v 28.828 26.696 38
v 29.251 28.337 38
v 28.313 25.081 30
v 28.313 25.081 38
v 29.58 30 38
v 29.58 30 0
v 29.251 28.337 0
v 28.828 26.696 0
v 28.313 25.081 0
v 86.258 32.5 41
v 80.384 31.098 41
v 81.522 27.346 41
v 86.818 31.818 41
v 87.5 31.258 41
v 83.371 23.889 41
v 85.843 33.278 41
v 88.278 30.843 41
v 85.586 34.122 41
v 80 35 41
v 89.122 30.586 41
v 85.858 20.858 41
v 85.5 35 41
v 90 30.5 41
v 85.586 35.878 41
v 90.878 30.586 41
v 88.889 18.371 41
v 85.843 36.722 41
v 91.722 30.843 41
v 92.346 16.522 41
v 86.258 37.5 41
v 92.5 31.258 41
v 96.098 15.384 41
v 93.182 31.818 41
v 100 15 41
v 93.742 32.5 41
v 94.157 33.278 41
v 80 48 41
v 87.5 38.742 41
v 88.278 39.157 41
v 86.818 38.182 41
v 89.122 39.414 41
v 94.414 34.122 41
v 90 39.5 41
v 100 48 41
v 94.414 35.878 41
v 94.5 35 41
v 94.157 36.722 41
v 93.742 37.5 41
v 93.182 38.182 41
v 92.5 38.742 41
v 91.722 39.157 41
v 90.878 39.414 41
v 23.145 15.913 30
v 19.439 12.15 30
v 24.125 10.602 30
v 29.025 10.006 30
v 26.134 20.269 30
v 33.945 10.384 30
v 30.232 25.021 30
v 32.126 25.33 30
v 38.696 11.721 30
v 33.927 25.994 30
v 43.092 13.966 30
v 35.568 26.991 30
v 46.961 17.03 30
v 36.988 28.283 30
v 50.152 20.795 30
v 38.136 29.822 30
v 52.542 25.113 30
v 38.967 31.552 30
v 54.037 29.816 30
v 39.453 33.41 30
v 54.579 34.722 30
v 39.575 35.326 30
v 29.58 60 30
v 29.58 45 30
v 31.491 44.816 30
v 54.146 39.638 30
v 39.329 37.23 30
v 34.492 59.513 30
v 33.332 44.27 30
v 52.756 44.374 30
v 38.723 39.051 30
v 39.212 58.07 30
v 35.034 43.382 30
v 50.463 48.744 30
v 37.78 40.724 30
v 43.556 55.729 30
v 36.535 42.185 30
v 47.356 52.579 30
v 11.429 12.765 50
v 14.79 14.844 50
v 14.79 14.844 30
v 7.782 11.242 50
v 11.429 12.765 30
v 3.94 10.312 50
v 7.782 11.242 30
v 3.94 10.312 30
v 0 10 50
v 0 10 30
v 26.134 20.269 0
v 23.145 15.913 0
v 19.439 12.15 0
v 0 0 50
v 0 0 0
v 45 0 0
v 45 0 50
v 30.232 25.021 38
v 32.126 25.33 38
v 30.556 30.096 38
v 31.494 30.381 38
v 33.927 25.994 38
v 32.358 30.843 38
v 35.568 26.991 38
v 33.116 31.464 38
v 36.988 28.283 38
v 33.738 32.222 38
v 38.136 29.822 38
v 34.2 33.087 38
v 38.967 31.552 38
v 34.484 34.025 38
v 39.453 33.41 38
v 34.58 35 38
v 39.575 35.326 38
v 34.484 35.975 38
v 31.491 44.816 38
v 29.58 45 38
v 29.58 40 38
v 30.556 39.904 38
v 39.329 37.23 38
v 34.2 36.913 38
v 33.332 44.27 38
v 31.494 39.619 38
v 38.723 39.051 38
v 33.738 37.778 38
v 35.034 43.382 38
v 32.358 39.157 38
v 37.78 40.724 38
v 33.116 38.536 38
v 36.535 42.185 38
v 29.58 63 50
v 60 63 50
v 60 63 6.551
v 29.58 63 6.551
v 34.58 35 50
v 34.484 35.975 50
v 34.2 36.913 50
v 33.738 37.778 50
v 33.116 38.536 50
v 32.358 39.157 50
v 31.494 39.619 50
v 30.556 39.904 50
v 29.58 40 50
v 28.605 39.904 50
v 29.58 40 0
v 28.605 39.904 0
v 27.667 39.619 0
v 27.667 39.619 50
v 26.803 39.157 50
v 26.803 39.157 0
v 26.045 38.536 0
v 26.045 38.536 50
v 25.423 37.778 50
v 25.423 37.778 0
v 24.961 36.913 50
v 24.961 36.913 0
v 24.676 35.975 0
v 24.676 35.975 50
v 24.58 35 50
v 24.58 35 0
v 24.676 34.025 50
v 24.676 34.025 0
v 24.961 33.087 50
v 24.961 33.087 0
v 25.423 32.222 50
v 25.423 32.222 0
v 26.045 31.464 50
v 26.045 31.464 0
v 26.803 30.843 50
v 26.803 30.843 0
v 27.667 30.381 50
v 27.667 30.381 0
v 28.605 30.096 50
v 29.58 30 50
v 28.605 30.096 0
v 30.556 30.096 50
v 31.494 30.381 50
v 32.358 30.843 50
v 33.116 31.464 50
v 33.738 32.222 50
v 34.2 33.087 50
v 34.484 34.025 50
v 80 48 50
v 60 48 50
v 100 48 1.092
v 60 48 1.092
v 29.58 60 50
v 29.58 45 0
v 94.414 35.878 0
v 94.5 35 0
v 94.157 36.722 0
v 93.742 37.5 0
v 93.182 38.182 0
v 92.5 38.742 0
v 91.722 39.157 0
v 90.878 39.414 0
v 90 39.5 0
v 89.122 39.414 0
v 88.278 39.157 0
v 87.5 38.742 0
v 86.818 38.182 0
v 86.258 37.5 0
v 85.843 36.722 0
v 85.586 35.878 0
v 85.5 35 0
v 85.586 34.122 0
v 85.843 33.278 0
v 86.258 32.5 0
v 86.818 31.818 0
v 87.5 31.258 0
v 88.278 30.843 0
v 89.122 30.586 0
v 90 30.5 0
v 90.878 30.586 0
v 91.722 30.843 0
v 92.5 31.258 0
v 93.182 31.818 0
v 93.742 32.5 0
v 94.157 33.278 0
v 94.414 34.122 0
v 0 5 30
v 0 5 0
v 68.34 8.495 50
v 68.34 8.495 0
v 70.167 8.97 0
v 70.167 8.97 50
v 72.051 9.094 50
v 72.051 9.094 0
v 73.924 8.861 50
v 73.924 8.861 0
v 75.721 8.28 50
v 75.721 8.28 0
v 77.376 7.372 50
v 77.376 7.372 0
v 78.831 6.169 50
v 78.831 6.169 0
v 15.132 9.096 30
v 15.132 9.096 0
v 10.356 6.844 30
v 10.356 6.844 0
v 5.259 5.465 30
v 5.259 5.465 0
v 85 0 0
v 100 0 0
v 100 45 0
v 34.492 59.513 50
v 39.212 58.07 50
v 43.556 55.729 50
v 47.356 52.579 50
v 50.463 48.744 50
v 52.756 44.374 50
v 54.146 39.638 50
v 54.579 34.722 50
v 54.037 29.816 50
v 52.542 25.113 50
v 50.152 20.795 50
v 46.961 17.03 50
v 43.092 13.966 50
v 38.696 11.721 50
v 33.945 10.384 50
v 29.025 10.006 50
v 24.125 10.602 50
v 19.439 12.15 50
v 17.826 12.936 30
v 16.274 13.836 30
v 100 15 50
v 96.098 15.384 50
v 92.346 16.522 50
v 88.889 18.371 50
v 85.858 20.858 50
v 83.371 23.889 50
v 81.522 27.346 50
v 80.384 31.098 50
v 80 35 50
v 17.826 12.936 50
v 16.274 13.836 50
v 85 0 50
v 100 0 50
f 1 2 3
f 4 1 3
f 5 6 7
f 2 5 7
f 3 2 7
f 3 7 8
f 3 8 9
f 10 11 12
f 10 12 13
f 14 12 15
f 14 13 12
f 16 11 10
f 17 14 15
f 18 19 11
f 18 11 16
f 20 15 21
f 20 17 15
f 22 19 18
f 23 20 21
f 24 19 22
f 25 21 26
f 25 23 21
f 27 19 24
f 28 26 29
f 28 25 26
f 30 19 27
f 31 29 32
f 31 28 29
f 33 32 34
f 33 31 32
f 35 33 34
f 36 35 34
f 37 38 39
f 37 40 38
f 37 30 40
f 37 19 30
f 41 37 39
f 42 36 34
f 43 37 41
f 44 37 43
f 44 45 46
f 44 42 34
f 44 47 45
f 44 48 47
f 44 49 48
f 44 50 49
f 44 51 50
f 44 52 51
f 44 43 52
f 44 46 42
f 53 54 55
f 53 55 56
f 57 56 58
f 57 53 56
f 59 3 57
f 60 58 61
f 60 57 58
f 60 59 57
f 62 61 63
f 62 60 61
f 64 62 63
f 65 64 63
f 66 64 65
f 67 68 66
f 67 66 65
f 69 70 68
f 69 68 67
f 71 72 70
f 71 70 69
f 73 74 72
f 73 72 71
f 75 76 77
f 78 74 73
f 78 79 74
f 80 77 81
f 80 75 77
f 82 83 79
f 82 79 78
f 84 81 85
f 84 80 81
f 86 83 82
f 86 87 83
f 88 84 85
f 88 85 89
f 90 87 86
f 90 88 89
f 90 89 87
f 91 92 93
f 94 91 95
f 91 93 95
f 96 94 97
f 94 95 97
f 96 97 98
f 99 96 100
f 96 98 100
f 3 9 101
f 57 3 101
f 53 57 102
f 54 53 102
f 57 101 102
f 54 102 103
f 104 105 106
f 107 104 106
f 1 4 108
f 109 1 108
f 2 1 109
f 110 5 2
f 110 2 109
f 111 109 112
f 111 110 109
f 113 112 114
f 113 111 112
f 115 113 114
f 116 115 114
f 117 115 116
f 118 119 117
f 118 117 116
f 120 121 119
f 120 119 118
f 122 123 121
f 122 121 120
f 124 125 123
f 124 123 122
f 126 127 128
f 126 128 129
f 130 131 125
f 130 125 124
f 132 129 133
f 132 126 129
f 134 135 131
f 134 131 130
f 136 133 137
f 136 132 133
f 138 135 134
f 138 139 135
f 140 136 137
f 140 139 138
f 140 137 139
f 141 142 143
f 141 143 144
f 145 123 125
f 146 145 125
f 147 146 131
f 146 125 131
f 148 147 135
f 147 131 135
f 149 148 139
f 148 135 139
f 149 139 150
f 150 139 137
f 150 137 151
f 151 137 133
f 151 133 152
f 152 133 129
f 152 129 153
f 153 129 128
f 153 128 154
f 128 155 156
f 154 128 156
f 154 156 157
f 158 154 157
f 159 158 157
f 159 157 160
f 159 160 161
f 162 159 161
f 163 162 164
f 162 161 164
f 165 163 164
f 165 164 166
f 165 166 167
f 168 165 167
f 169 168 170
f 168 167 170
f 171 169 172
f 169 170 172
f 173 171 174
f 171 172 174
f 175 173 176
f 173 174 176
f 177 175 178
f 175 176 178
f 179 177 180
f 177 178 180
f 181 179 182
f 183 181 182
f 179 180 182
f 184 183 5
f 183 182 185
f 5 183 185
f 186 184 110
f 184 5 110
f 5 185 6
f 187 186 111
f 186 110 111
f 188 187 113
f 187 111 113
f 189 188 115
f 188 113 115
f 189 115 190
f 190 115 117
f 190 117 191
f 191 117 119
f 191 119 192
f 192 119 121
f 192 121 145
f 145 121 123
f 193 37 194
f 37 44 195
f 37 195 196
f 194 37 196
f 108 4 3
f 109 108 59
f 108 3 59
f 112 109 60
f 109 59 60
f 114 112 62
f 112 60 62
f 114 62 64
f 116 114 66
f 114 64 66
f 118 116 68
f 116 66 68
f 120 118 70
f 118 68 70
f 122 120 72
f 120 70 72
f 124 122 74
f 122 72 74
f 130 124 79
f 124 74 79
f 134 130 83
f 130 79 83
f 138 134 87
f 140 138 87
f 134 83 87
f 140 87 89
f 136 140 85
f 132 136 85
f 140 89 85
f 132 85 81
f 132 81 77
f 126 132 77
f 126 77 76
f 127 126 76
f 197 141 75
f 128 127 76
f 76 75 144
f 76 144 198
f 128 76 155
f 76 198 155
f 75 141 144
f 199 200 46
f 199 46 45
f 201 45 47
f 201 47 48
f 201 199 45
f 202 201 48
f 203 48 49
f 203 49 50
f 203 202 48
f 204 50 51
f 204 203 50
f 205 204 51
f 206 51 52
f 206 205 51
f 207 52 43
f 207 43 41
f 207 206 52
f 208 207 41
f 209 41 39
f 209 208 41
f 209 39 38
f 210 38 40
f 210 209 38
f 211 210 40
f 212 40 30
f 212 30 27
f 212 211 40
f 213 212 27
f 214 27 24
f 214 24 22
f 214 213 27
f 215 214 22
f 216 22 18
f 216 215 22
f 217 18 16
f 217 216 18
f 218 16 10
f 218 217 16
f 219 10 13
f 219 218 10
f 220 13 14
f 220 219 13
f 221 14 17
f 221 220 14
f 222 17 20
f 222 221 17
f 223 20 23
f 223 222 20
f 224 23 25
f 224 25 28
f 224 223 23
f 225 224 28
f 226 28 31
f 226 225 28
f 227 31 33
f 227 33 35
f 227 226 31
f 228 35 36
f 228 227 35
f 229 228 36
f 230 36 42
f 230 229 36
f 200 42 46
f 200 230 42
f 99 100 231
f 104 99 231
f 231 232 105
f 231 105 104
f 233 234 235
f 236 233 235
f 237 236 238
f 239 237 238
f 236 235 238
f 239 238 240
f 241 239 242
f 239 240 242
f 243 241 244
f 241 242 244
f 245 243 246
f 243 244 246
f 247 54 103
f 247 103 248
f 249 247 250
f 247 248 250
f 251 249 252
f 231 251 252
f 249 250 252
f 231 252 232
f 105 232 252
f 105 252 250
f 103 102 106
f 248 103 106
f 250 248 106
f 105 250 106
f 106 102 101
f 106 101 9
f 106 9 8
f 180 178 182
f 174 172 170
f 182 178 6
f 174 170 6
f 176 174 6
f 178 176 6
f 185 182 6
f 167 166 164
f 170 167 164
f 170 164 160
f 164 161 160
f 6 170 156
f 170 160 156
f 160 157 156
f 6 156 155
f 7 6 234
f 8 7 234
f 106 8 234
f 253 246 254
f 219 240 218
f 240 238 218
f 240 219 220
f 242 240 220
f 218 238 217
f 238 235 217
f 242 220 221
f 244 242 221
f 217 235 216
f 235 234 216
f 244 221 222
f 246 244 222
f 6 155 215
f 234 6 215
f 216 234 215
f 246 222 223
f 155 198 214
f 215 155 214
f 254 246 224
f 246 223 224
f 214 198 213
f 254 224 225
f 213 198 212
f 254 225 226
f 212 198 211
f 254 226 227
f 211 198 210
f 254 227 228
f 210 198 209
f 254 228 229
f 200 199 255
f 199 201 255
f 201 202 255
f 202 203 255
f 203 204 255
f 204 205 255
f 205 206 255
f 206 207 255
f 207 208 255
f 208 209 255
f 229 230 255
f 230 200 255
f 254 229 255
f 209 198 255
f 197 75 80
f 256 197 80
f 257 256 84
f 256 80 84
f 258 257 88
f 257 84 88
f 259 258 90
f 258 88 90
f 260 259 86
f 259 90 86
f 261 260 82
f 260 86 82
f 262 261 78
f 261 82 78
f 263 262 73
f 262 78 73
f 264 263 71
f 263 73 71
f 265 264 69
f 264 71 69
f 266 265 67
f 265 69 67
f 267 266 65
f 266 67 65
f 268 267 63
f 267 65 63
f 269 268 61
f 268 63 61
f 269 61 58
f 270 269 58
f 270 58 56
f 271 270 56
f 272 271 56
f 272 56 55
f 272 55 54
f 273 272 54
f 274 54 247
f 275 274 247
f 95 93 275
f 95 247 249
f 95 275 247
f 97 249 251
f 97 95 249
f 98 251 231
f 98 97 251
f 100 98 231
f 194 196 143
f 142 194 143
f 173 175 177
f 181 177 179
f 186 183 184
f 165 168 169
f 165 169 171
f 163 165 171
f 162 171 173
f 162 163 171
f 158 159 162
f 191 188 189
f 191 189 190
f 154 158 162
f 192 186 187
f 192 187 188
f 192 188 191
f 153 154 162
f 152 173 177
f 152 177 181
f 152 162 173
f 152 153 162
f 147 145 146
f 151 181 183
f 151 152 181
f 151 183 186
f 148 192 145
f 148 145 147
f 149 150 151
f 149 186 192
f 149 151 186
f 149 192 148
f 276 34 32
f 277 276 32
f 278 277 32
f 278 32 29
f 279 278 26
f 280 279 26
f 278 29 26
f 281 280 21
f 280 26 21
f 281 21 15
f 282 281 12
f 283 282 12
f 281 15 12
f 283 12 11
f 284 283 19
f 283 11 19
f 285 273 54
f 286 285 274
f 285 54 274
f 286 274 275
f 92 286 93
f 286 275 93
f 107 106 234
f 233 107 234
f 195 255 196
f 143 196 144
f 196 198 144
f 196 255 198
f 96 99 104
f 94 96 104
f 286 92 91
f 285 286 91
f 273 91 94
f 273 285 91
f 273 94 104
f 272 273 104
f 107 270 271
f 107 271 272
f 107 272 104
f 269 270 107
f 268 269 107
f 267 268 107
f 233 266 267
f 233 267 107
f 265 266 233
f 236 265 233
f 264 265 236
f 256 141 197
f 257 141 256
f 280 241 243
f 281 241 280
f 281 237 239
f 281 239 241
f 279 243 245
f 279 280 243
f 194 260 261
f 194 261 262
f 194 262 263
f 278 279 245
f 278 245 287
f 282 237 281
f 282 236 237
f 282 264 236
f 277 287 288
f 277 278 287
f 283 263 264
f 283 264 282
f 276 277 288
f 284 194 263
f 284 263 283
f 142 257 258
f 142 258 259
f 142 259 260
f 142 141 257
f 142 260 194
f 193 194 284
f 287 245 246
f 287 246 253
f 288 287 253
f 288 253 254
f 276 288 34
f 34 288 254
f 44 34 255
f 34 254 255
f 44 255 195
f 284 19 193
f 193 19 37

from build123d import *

# Parameters (mm, degrees)
BOSS_EXTRUDE1_DEPTH     = 50
SKETCH1_R               = 5
BOSS_EXTRUDE1_2_DEPTH   = 50
SKETCH1_5_R             = 4.5
BOSS_EXTRUDE2_DEPTH     = 41
BOSS_EXTRUDE3_DEPTH     = 30
BOSS_EXTRUDE4_DEPTH     = 38
CUT_EXTRUDE1_DEPTH      = 30
CUT_EXTRUDE2_DEPTH      = 101.344406919
CUT_EXTRUDE2_DEPTH_BACK = 101.344406919


with BuildPart() as part:
    # Sketch1 → Boss-Extrude1 (new body)
    with BuildSketch(Plane.XY):
        with BuildLine():
            Line((80, 48), (60, 48))
            Line((60, 48), (60, 63))
            Line((60, 63), (29.580398915, 63))
            Line((29.580398915, 63), (29.580398915, 60))
            ThreePointArc((29.580398915, 60), (53.338461855, 27.218326313), (14.790199458, 14.844355629))
            ThreePointArc((14.790199458, 14.844355629), (7.781673687, 11.241937061), (0, 10))
            Line((0, 10), (0, 0))
            Line((0, 0), (45, 0))
            Line((45, 0), (68.339650933, 8.494938218))
            ThreePointArc((68.339650933, 8.494938218), (73.924248506, 8.860972081), (78.830920178, 6.169079822))
            Line((78.830920178, 6.169079822), (85, 0))
            Line((85, 0), (100, 0))
            Line((100, 0), (100, 15))
            ThreePointArc((100, 15), (85.857864376, 20.857864376), (80, 35))
            Line((80, 35), (80, 48))
        make_face()
    extrude(amount=BOSS_EXTRUDE1_DEPTH)

    # Sketch1<5> → Boss-Extrude2 (add)
    with BuildSketch(Plane.XY):
        with BuildLine():
            Line((100, 48), (80, 48))
            Line((80, 48), (80, 35))
            ThreePointArc((80, 35), (85.857864376, 20.857864376), (100, 15))
            Line((100, 15), (100, 48))
        make_face()
        with Locations((90, 35)):
            Circle(SKETCH1_5_R, mode=Mode.SUBTRACT)
    extrude(amount=BOSS_EXTRUDE2_DEPTH)

    # Sketch1<6> → Boss-Extrude3 (add)
    with BuildSketch(Plane.XY):
        with BuildLine():
            ThreePointArc((19.438547859, 12.149554553), (54.037106954, 29.816426724), (29.580398915, 60))
            Line((29.580398915, 60), (29.580398915, 45))
            ThreePointArc((29.580398915, 45), (39.560207875, 34.364851879), (28.312667533, 25.080682627))
            ThreePointArc((28.312667533, 25.080682627), (24.735564703, 18.024964247), (19.438547859, 12.149554553))
        make_face()
    extrude(amount=BOSS_EXTRUDE3_DEPTH)



with BuildPart() as body_2:
    # Sketch1 → Boss-Extrude1 2 (new body)
    with BuildSketch(Plane.XY):
        with Locations((29.580398915, 35)):
            Circle(SKETCH1_R)
    extrude(amount=BOSS_EXTRUDE1_2_DEPTH)


with BuildPart() as part_1:
    add(part.part)

    add(body_2.part)  # Boss-Extrude4 merges body 2
    # Sketch1<7> → Boss-Extrude4 (add)
    with BuildSketch(Plane.XY):
        with BuildLine():
            ThreePointArc((28.312667533, 25.080682627), (39.560207875, 34.364851879), (29.580398915, 45))
            Line((29.580398915, 45), (29.580398915, 40))
            ThreePointArc((29.580398915, 40), (33.115932821, 38.535533906), (34.580398915, 35))
            ThreePointArc((34.580398915, 35), (33.115932821, 31.464466094), (29.580398915, 30))
            ThreePointArc((29.580398915, 30), (29.050846917, 27.513459181), (28.312667533, 25.080682627))
        make_face()
    extrude(amount=BOSS_EXTRUDE4_DEPTH)

    # Sketch4 → Cut-Extrude1 (cut)
    with BuildSketch(Plane.XY):
        with BuildLine():
            Line((0, 10), (0, 35))
            Line((0, 35), (24.580398915, 35))
            ThreePointArc((24.580398915, 35), (26.04486501, 31.464466094), (29.580398915, 30))
            ThreePointArc((29.580398915, 30), (19.364916731, 12.087121525), (0, 5))
            Line((0, 5), (0, 10))
        make_face()
    extrude(amount=CUT_EXTRUDE1_DEPTH, mode=Mode.SUBTRACT)

    # Sketch5 → Cut-Extrude2 (cut, two sides: drawn at the far end of the back side and taken through both)
    with BuildSketch(Plane(origin=(60, 0, 0), x_dir=(0, 0, -1), z_dir=(1, 0, 0)).offset(-CUT_EXTRUDE2_DEPTH_BACK)):
        Polygon((0, 45), (-6.551464217, 63), (0, 63), align=None)
    extrude(amount=CUT_EXTRUDE2_DEPTH + CUT_EXTRUDE2_DEPTH_BACK, mode=Mode.SUBTRACT)


solid = part_1.part
